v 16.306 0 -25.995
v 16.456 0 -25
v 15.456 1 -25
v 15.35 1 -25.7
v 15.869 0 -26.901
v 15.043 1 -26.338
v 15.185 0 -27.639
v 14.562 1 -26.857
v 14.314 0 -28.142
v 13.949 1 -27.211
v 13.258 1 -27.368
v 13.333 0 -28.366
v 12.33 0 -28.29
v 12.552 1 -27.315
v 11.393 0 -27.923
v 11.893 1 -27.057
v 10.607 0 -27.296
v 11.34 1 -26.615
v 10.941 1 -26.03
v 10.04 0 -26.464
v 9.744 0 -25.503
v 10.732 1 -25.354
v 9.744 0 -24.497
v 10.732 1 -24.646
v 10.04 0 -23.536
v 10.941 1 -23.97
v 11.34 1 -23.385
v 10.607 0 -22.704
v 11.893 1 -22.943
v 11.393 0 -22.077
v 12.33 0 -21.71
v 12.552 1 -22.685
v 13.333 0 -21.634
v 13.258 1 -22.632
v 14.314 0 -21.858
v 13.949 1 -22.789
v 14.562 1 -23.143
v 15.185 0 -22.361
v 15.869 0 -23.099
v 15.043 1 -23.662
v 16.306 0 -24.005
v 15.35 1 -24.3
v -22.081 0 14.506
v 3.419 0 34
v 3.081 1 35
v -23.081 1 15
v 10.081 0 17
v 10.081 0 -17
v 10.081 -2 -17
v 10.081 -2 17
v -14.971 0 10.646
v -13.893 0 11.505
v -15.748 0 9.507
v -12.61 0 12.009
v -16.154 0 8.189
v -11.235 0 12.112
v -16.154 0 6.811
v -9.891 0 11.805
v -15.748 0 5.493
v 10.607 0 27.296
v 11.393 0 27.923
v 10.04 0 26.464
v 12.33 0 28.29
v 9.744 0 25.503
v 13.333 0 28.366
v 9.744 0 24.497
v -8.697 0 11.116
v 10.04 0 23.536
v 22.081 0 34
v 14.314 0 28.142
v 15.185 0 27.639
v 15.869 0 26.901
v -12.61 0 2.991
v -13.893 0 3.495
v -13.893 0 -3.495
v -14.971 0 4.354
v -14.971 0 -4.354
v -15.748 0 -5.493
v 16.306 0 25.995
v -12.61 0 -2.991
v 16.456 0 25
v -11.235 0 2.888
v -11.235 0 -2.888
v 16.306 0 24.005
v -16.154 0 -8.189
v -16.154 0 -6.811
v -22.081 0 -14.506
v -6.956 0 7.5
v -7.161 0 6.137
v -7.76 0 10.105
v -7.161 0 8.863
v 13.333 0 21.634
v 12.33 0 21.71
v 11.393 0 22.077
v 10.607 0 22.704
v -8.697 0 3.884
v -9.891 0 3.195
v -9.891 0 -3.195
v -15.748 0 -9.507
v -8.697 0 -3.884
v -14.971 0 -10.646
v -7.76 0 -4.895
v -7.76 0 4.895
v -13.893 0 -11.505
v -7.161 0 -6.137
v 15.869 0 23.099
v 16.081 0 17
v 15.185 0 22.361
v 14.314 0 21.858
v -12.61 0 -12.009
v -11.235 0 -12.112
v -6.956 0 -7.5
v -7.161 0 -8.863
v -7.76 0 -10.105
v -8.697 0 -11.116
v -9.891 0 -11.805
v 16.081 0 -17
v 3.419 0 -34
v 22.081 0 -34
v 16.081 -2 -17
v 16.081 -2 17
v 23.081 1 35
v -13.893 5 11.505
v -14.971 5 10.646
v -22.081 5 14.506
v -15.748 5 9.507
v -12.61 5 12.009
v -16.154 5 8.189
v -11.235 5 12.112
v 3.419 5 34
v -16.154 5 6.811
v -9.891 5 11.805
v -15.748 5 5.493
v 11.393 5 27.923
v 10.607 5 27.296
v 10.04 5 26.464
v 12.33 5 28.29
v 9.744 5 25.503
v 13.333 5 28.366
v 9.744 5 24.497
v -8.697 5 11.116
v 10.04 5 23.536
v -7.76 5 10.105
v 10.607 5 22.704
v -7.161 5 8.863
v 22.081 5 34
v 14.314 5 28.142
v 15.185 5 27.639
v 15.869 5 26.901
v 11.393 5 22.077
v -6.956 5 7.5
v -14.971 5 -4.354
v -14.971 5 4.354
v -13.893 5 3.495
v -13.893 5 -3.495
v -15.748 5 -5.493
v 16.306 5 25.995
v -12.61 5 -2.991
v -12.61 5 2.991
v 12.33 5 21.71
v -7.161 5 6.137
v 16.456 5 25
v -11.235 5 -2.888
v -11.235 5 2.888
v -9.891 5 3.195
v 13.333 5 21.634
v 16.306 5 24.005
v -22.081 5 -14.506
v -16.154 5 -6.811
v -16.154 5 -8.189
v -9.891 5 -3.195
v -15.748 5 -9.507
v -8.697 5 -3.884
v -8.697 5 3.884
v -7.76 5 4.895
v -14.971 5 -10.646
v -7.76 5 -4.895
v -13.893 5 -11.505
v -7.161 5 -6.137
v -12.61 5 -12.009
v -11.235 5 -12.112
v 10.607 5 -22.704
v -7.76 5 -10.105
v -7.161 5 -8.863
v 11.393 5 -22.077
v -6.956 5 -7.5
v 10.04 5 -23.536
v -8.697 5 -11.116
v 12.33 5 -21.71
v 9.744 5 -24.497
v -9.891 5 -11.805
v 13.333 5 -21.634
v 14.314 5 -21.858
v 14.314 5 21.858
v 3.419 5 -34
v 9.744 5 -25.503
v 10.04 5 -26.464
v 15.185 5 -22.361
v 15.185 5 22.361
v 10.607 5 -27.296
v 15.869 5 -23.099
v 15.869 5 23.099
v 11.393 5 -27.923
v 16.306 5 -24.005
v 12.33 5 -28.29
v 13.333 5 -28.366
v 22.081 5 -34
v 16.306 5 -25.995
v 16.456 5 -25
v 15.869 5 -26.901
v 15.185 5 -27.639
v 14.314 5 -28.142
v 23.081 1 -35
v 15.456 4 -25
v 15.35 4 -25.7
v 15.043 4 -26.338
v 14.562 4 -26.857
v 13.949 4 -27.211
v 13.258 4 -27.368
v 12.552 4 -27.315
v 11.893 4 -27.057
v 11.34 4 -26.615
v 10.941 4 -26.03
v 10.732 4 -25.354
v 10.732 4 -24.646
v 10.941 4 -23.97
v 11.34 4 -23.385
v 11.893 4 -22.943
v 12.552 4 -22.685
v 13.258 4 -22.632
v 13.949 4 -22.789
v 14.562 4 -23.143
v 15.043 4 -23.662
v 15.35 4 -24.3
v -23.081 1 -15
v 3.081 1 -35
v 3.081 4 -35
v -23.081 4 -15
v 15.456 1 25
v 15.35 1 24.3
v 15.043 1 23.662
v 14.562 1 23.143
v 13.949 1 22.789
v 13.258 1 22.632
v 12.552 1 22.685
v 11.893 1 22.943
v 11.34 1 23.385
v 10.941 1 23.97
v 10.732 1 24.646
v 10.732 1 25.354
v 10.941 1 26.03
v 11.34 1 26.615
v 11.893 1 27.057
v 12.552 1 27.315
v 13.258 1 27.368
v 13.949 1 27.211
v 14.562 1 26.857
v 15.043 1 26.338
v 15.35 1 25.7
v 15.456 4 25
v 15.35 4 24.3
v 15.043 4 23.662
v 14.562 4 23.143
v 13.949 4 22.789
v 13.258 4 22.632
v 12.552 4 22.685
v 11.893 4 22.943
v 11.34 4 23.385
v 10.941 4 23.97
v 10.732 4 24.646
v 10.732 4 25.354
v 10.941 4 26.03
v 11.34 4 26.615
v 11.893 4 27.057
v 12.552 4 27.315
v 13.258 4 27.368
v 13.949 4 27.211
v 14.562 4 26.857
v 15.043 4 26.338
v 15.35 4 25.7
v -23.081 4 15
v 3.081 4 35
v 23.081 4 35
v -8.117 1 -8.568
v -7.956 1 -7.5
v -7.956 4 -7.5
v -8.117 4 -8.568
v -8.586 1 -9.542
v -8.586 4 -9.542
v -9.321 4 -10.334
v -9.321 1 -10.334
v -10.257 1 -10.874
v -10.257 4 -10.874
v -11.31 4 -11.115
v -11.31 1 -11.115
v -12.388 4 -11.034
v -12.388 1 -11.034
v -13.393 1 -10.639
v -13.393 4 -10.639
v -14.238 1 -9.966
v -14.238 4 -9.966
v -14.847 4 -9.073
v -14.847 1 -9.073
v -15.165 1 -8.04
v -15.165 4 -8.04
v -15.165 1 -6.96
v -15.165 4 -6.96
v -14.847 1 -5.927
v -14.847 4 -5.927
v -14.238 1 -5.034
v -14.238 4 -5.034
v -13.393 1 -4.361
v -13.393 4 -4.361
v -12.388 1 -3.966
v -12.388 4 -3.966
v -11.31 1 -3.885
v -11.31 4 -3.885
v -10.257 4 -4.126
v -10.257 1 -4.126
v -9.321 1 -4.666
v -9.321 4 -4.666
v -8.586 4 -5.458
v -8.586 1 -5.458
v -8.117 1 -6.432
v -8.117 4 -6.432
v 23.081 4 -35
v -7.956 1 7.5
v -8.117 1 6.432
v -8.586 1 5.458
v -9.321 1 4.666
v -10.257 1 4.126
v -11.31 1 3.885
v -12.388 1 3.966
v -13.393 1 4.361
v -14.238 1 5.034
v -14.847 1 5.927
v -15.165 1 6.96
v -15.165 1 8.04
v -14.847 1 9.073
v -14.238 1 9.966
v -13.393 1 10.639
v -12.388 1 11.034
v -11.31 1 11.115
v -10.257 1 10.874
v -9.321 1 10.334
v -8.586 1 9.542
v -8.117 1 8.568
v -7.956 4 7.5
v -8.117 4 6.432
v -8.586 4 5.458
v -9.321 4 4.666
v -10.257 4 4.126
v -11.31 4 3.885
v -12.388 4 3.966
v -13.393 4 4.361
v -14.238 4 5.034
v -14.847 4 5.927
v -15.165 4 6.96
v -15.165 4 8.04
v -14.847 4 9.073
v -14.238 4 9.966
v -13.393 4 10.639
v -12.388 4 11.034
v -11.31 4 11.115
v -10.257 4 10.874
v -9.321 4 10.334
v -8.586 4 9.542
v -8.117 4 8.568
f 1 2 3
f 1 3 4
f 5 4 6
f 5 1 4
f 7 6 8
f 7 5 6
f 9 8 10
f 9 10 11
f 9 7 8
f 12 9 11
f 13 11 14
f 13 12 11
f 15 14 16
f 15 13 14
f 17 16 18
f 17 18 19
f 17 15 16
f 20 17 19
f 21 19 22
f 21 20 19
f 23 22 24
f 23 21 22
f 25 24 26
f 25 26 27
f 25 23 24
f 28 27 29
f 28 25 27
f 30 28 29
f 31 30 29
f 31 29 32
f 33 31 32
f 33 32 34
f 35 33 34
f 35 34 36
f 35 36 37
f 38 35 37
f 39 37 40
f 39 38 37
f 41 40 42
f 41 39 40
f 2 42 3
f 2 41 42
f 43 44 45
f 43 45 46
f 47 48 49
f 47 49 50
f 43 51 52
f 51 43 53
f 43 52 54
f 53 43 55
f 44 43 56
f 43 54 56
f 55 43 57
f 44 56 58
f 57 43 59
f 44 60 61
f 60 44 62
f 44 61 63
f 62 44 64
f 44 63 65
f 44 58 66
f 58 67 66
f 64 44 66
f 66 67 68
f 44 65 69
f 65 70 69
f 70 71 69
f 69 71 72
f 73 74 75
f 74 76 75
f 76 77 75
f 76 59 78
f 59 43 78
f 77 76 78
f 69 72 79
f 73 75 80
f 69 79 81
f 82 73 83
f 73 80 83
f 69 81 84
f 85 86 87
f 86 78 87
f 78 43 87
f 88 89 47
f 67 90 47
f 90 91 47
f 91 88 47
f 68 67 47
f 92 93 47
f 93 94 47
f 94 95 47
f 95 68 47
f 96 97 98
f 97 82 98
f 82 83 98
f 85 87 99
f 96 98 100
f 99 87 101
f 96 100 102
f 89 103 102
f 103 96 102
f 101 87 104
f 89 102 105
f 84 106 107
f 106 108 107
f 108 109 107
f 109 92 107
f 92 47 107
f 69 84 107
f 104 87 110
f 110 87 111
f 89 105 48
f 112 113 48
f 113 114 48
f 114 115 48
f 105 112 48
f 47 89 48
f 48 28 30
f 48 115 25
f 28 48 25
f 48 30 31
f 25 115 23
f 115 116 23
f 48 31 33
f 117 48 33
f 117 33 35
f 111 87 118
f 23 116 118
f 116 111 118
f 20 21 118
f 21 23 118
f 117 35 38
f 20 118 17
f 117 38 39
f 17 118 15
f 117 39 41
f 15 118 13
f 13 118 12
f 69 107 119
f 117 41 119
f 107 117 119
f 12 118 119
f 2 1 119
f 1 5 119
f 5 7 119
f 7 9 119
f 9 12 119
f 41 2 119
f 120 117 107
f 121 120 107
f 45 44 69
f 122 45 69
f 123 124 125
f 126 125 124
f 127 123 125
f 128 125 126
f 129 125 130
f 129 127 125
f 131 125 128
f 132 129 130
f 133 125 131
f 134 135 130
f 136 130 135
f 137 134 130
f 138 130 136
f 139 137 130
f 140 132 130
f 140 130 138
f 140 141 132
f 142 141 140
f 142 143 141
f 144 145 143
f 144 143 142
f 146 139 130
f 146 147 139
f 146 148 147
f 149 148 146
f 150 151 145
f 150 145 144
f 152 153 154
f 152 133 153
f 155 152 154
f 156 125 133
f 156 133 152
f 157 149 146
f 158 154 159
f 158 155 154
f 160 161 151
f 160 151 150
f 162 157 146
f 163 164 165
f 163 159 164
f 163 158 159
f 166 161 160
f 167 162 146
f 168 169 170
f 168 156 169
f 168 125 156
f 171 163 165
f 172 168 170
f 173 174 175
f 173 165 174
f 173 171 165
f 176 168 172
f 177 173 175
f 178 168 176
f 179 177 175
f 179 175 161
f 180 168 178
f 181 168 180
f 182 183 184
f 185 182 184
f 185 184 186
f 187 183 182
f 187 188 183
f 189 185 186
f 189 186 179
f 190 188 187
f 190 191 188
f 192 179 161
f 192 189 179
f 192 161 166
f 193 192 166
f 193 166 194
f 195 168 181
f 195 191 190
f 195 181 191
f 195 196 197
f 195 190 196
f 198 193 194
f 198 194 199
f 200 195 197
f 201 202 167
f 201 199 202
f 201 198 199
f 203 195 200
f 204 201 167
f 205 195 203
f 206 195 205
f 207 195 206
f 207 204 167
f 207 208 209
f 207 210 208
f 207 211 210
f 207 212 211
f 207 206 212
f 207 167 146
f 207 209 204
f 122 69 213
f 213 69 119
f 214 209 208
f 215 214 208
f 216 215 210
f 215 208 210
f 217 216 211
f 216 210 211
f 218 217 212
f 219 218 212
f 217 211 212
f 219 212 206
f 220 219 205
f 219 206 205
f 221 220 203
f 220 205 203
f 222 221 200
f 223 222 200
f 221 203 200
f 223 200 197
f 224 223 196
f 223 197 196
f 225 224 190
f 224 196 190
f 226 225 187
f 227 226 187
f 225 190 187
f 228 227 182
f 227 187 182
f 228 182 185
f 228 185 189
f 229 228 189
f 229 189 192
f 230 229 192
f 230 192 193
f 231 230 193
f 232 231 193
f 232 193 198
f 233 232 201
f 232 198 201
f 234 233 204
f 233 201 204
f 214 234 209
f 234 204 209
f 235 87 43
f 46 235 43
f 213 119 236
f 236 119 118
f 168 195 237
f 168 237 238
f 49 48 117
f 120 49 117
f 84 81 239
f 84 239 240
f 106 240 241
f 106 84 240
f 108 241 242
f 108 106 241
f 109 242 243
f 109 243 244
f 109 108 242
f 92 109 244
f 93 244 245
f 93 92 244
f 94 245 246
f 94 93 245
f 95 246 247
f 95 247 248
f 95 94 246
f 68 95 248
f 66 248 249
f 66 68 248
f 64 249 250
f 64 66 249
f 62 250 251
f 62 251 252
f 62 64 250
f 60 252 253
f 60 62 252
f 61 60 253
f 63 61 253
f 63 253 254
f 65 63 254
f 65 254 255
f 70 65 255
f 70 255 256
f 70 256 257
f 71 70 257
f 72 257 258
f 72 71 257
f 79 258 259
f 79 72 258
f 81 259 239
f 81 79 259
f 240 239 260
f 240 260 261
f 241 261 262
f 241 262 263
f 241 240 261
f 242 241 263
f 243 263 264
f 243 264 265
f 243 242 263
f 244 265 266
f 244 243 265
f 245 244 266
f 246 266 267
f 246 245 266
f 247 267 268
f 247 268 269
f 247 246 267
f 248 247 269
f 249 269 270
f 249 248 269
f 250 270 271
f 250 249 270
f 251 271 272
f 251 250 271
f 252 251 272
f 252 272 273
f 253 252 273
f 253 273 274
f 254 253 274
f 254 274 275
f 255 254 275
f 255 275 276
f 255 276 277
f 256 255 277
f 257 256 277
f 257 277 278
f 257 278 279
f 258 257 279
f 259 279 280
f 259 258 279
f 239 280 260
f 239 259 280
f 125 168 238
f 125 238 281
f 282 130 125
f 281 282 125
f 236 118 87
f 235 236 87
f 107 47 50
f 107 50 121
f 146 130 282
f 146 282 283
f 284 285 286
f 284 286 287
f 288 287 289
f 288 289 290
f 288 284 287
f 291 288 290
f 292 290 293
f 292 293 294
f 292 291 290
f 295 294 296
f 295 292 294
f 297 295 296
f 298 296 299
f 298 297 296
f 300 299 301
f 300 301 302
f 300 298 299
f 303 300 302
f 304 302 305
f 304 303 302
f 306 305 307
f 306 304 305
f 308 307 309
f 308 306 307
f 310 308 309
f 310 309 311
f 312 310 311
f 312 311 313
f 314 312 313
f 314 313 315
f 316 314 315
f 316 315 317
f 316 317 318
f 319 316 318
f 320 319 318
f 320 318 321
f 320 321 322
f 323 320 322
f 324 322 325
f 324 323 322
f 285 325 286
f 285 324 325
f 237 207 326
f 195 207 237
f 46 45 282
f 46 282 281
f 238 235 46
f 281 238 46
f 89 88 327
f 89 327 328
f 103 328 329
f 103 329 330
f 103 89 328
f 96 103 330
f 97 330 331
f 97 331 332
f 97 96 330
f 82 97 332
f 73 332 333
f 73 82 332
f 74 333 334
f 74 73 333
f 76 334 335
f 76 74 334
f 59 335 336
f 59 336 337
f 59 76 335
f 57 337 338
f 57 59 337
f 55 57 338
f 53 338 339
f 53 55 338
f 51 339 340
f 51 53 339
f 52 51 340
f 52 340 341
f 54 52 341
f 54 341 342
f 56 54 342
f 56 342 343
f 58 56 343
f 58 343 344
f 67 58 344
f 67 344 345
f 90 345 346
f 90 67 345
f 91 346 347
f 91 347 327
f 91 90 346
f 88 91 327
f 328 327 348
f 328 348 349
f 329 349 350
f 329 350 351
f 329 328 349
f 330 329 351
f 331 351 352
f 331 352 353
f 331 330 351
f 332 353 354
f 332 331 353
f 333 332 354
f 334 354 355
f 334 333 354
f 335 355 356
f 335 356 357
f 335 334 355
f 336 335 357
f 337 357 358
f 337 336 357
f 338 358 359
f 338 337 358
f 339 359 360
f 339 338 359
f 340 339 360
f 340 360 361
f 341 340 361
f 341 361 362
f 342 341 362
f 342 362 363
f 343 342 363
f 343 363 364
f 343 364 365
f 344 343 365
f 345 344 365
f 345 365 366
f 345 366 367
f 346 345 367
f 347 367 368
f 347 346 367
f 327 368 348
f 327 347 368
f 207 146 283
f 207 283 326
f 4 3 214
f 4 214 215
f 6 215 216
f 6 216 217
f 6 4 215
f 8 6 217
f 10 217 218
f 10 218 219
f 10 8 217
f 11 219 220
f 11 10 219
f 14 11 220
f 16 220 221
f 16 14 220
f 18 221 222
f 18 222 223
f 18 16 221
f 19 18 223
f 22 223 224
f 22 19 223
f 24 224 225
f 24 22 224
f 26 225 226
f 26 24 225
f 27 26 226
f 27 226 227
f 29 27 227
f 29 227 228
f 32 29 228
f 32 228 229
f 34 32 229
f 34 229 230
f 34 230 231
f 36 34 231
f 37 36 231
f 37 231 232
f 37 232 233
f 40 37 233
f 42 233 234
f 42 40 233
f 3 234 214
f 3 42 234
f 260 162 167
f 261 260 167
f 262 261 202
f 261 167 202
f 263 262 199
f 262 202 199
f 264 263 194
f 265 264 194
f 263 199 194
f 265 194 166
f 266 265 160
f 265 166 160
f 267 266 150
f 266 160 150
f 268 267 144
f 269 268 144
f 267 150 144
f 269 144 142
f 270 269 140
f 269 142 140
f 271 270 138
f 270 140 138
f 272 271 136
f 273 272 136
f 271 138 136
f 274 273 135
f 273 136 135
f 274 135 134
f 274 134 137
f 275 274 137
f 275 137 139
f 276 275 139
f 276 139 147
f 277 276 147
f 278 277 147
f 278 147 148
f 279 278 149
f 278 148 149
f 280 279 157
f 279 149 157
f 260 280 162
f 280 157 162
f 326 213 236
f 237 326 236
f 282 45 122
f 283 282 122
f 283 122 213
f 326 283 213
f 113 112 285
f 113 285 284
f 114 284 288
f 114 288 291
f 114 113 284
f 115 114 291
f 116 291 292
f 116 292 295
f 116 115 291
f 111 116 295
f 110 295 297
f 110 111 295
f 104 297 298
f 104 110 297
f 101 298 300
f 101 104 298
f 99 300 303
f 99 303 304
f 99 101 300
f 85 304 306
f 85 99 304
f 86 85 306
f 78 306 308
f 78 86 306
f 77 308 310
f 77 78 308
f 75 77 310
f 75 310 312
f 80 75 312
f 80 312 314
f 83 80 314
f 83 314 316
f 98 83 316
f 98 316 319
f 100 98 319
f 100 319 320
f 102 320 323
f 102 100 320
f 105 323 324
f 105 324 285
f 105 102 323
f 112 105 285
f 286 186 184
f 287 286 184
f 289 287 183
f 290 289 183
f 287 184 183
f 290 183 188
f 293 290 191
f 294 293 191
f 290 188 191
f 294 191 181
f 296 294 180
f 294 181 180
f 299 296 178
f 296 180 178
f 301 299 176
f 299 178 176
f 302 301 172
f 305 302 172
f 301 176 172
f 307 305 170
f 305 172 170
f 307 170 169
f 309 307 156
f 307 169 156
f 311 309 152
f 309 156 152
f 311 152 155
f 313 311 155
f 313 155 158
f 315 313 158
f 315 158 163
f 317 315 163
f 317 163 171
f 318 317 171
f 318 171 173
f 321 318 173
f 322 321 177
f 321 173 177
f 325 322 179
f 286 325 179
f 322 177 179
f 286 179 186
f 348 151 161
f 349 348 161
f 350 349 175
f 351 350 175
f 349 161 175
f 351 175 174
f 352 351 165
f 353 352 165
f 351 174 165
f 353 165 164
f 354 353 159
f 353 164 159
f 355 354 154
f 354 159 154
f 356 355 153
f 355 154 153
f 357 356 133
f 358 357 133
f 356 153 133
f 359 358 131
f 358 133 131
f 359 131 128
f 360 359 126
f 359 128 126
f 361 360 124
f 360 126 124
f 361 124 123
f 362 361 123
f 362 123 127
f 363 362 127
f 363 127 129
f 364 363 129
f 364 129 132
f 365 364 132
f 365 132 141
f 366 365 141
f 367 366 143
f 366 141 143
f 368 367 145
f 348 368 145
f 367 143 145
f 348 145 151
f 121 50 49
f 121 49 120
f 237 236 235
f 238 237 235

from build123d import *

# Parameters (mm, degrees)
ESBO_O1_R                = 3.625
ESBO_O1_R_2              = 2.375
RESSALTO_EXTRUS_O1_DEPTH = 5
CHANFRO2_SIZE            = 1
ESBO_O2_W                = 6
ESBO_O2_H                = 34
RESSALTO_EXTRUS_O2_DEPTH = 2


with BuildPart() as part:
    # Esboço1 → Ressalto-extrusão1 (new body)
    with BuildSketch(Plane(origin=(0, 0, 0), x_dir=(1, 0, 0), z_dir=(0, 1, 0))):
        Polygon((-23.080933084, -15), (3.080933084, -15), (3.080933084, -35), (23.080933084, -35), (23.080933084, -15), (23.080933084, 15), (23.080933084, 35), (3.080933084, 35), (3.080933084, 15), (-23.080933084, 15), align=None)
        with Locations((-11.580933084, -7.5)):
            Circle(ESBO_O1_R, mode=Mode.SUBTRACT)
        with Locations((-11.580933084, 7.5)):
            Circle(ESBO_O1_R, mode=Mode.SUBTRACT)
        with Locations((13.080933084, -25)):
            Circle(ESBO_O1_R_2, mode=Mode.SUBTRACT)
        with Locations((13.080933084, 25)):
            Circle(ESBO_O1_R_2, mode=Mode.SUBTRACT)
        Polygon((-23.080933084, 15), (3.080933084, 15), (3.080933084, 35), align=None)
        Polygon((3.080933084, -15), (3.080933084, -35), (-23.080933084, -15), align=None)
    extrude(amount=RESSALTO_EXTRUS_O1_DEPTH)

    # Chanfro2
    chanfro2_edges = [part.edges().sort_by_distance(p)[0] for p in [
        (10.705933084, 0, -25),
        (10.705933084, 0, 25),
        (-10, 5, -25),
        (-15.205933084, 0, -7.5),
        (-15.205933084, 0, 7.5),
        (23.080933084, 0, 0),
        (13.080933084, 0, 35),
        (-10, 0, 25),
        (-23.080933084, 0, 0),
        (-10, 0, -25),
        (-23.080933084, 5, 0),
        (13.080933084, 0, -35),
        (-10, 5, 25),
        (13.080933084, 5, 35),
        (23.080933084, 5, 0),
        (-15.205933084, 5, 7.5),
        (-15.205933084, 5, -7.5),
        (10.705933084, 5, 25),
        (10.705933084, 5, -25),
        (13.080933084, 5, -35),
    ]]
    chamfer(chanfro2_edges, length=CHANFRO2_SIZE)

    # Esboço2 → Ressalto-extrusão2 (add)
    with BuildSketch(Plane.XZ):
        with Locations((13.080933084, 0)):
            Rectangle(ESBO_O2_W, ESBO_O2_H)
    extrude(amount=RESSALTO_EXTRUS_O2_DEPTH)


solid = part.part
